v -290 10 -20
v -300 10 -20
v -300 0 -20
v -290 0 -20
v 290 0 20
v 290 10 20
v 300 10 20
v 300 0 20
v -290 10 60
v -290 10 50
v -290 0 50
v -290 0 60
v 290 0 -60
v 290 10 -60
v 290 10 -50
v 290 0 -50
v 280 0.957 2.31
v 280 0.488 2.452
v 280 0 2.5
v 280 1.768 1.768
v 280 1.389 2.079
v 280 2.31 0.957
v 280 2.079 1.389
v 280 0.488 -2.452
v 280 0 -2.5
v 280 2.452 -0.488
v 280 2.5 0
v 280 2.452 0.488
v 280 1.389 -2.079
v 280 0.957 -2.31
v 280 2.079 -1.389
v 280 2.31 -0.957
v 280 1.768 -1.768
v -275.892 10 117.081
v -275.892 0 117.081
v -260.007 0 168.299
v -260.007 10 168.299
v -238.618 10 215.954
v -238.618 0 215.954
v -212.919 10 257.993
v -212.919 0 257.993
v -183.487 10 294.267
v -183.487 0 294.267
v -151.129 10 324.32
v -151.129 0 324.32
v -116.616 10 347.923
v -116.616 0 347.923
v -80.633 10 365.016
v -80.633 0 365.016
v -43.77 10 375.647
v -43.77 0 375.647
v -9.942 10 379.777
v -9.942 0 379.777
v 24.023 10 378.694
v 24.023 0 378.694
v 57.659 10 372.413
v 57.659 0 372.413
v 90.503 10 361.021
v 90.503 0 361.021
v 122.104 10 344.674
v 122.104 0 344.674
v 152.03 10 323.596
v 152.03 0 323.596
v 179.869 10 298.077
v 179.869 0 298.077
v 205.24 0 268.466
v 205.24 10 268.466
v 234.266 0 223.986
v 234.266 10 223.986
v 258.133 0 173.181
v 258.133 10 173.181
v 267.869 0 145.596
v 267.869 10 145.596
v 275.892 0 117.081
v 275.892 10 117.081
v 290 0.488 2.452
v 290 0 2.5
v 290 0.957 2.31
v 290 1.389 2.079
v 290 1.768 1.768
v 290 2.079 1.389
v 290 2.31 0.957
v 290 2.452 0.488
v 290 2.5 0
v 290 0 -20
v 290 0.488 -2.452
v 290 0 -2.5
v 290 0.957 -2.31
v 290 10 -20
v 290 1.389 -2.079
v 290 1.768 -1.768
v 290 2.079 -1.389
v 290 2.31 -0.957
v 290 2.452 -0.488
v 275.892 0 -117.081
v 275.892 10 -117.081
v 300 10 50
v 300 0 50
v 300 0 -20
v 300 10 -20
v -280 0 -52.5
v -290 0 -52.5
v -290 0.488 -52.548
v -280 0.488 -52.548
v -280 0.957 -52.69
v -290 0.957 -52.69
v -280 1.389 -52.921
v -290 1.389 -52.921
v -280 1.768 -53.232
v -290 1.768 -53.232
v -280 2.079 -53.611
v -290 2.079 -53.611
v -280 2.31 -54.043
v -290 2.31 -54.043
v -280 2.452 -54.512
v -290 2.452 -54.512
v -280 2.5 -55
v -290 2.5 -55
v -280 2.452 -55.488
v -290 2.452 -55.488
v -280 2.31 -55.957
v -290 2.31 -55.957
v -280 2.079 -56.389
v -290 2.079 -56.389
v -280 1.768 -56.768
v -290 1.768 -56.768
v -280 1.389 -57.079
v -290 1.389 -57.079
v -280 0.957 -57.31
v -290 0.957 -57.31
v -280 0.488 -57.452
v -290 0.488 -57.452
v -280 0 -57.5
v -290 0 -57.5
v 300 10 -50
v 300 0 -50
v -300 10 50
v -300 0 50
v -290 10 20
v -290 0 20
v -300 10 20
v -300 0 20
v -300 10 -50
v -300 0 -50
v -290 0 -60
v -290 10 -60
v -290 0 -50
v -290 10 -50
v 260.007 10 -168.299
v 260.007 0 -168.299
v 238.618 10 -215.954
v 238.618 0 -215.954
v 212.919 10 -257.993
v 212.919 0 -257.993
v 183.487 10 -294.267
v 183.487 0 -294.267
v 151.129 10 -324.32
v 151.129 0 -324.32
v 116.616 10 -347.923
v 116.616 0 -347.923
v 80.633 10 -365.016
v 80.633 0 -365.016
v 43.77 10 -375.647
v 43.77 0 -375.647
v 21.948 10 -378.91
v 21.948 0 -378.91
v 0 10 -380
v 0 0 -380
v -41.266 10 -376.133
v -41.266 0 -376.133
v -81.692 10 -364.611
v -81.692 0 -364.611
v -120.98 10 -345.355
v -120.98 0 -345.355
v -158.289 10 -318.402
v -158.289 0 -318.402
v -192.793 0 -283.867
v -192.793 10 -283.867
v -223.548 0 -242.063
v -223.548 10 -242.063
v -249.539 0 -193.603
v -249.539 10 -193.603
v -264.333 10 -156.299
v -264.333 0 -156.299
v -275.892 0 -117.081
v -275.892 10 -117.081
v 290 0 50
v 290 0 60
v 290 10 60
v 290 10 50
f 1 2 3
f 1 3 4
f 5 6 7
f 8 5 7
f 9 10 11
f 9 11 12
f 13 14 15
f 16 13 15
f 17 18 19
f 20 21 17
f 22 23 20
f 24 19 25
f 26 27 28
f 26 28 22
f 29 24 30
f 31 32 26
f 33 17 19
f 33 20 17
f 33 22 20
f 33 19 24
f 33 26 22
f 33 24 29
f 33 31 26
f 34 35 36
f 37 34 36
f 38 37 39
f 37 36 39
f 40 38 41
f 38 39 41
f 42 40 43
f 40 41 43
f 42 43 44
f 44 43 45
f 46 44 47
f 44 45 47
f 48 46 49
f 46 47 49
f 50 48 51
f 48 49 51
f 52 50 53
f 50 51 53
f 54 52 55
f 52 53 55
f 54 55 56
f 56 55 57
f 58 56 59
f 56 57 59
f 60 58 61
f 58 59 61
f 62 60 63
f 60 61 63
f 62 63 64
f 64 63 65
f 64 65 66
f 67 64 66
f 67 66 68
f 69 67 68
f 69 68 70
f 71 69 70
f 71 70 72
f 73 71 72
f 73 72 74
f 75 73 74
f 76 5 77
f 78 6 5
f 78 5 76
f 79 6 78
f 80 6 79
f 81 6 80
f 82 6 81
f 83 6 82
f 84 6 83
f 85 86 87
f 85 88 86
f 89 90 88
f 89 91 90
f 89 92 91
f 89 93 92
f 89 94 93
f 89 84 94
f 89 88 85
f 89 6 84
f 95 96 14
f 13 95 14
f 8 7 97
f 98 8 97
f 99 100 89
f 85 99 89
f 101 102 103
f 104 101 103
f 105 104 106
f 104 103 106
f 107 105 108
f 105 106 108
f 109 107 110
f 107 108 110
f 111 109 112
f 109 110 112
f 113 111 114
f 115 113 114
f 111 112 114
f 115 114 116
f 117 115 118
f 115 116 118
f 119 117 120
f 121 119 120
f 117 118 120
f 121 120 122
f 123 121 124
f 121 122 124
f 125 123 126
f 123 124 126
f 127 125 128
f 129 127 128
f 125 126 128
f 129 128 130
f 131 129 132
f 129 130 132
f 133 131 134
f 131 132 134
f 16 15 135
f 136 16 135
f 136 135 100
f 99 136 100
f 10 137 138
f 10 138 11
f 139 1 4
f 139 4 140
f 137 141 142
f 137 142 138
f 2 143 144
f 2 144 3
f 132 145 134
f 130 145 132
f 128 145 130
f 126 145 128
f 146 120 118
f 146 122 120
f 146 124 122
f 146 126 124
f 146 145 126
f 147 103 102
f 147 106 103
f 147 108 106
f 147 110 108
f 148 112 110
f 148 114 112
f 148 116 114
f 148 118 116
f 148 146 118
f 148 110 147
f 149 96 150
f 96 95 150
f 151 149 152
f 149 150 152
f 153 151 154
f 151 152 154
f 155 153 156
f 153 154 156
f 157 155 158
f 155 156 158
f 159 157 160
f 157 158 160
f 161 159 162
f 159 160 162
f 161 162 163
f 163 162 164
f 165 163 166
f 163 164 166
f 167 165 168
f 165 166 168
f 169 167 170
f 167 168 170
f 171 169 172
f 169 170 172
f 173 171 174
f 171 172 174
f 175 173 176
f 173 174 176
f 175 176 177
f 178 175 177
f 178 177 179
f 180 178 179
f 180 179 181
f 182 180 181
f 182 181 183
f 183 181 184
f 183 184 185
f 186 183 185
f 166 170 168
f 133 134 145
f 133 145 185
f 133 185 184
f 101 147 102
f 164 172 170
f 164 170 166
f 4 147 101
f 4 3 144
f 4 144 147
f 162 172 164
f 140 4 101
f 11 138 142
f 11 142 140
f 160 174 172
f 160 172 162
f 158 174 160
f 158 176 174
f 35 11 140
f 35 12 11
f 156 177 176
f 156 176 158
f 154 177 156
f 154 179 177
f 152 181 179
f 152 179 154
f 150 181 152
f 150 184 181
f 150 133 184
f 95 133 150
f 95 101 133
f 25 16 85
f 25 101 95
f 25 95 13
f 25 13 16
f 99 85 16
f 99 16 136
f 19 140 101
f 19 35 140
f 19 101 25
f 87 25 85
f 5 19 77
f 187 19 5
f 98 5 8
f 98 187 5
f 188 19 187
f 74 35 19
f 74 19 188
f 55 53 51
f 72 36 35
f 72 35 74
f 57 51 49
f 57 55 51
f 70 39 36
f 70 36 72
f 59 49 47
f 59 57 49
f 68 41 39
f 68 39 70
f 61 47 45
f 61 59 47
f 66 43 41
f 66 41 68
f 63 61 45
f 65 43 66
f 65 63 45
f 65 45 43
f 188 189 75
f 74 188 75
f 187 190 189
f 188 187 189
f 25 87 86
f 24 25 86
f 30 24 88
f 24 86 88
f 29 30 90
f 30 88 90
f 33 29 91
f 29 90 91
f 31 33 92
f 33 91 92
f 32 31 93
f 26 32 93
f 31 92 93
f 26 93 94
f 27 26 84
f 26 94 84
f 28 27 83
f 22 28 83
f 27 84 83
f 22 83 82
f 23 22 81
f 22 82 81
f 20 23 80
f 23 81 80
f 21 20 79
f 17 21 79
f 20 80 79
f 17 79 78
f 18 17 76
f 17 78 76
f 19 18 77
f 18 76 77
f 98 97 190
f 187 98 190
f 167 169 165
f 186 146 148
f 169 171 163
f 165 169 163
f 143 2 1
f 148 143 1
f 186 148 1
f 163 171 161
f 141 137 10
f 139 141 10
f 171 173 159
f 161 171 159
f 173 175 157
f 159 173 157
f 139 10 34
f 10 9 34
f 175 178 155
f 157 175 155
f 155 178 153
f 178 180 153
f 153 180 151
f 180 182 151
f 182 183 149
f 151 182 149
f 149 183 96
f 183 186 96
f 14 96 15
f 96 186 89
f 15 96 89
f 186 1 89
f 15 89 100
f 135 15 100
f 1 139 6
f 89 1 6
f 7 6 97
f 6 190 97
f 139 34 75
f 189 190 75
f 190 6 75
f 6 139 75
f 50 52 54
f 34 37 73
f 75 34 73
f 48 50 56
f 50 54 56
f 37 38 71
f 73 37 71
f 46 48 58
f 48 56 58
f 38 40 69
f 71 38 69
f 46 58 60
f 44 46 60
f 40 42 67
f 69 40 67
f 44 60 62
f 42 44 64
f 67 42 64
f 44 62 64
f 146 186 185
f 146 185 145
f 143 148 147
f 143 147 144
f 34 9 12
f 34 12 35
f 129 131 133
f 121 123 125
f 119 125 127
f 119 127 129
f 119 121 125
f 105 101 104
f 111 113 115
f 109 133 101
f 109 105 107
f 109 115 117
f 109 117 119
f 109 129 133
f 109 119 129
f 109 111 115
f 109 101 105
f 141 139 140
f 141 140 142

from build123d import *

# Parameters (mm, degrees)
SKETCH1_RX          = 380
SKETCH1_RY          = 290
BOSS_EXTRUDE1_DEPTH = 10
BOSS_EXTRUDE2_DEPTH = 10
CUT_EXTRUDE1_DEPTH  = 10
CUT_EXTRUDE2_DEPTH  = 10


with BuildPart() as part:
    # Sketch1 → Boss-Extrude1 (new body)
    with BuildSketch(Plane(origin=(0, 0, 0), x_dir=(1, 0, 0), z_dir=(0, 1, 0))):
        with Locations(Location((0, 0), (0, 0, 90))):
            Ellipse(SKETCH1_RX, SKETCH1_RY)
    extrude(amount=BOSS_EXTRUDE1_DEPTH)

    # Sketch2 → Boss-Extrude2 (add)
    with BuildSketch(Plane(origin=(0, 10, 0), x_dir=(-1, 0, 0), z_dir=(0, 1, 0))):
        Polygon((-275.891891892, -117.081081081), (-290, -60), (-290, -50), (-300, -50), (-300, -20), (-290, -20), (-290, 0), (-290, 20), (-300, 20), (-300, 50), (-290, 50), (-290, 60), (-275.891891892, 117.081081081), align=None)
        Polygon((275.891891892, 117.081081081), (275.891891892, -117.081081081), (290, -60), (290, -50), (300, -50), (300, -20), (290, -20), (290, 0), (290, 20), (300, 20), (300, 50), (290, 50), (290, 60), align=None)
    extrude(amount=-BOSS_EXTRUDE2_DEPTH)

    # Sketch3 → Cut-Extrude1 (cut)
    with BuildSketch(Plane(origin=(290, 0, 0), x_dir=(0, 0, -1), z_dir=(1, 0, 0))):
        with BuildLine():
            Line((-2.5, 0), (2.5, 0))
            ThreePointArc((2.5, 0), (0, 2.5), (-2.5, 0))
        make_face()
    extrude(amount=-CUT_EXTRUDE1_DEPTH, mode=Mode.SUBTRACT)

    # Sketch4 → Cut-Extrude2 (cut)
    with BuildSketch(Plane.ZY.offset(290)):
        with BuildLine():
            Line((-57.5, 0), (-52.5, 0))
            ThreePointArc((-52.5, 0), (-55, 2.5), (-57.5, 0))
        make_face()
    extrude(amount=-CUT_EXTRUDE2_DEPTH, mode=Mode.SUBTRACT)


solid = part.part
